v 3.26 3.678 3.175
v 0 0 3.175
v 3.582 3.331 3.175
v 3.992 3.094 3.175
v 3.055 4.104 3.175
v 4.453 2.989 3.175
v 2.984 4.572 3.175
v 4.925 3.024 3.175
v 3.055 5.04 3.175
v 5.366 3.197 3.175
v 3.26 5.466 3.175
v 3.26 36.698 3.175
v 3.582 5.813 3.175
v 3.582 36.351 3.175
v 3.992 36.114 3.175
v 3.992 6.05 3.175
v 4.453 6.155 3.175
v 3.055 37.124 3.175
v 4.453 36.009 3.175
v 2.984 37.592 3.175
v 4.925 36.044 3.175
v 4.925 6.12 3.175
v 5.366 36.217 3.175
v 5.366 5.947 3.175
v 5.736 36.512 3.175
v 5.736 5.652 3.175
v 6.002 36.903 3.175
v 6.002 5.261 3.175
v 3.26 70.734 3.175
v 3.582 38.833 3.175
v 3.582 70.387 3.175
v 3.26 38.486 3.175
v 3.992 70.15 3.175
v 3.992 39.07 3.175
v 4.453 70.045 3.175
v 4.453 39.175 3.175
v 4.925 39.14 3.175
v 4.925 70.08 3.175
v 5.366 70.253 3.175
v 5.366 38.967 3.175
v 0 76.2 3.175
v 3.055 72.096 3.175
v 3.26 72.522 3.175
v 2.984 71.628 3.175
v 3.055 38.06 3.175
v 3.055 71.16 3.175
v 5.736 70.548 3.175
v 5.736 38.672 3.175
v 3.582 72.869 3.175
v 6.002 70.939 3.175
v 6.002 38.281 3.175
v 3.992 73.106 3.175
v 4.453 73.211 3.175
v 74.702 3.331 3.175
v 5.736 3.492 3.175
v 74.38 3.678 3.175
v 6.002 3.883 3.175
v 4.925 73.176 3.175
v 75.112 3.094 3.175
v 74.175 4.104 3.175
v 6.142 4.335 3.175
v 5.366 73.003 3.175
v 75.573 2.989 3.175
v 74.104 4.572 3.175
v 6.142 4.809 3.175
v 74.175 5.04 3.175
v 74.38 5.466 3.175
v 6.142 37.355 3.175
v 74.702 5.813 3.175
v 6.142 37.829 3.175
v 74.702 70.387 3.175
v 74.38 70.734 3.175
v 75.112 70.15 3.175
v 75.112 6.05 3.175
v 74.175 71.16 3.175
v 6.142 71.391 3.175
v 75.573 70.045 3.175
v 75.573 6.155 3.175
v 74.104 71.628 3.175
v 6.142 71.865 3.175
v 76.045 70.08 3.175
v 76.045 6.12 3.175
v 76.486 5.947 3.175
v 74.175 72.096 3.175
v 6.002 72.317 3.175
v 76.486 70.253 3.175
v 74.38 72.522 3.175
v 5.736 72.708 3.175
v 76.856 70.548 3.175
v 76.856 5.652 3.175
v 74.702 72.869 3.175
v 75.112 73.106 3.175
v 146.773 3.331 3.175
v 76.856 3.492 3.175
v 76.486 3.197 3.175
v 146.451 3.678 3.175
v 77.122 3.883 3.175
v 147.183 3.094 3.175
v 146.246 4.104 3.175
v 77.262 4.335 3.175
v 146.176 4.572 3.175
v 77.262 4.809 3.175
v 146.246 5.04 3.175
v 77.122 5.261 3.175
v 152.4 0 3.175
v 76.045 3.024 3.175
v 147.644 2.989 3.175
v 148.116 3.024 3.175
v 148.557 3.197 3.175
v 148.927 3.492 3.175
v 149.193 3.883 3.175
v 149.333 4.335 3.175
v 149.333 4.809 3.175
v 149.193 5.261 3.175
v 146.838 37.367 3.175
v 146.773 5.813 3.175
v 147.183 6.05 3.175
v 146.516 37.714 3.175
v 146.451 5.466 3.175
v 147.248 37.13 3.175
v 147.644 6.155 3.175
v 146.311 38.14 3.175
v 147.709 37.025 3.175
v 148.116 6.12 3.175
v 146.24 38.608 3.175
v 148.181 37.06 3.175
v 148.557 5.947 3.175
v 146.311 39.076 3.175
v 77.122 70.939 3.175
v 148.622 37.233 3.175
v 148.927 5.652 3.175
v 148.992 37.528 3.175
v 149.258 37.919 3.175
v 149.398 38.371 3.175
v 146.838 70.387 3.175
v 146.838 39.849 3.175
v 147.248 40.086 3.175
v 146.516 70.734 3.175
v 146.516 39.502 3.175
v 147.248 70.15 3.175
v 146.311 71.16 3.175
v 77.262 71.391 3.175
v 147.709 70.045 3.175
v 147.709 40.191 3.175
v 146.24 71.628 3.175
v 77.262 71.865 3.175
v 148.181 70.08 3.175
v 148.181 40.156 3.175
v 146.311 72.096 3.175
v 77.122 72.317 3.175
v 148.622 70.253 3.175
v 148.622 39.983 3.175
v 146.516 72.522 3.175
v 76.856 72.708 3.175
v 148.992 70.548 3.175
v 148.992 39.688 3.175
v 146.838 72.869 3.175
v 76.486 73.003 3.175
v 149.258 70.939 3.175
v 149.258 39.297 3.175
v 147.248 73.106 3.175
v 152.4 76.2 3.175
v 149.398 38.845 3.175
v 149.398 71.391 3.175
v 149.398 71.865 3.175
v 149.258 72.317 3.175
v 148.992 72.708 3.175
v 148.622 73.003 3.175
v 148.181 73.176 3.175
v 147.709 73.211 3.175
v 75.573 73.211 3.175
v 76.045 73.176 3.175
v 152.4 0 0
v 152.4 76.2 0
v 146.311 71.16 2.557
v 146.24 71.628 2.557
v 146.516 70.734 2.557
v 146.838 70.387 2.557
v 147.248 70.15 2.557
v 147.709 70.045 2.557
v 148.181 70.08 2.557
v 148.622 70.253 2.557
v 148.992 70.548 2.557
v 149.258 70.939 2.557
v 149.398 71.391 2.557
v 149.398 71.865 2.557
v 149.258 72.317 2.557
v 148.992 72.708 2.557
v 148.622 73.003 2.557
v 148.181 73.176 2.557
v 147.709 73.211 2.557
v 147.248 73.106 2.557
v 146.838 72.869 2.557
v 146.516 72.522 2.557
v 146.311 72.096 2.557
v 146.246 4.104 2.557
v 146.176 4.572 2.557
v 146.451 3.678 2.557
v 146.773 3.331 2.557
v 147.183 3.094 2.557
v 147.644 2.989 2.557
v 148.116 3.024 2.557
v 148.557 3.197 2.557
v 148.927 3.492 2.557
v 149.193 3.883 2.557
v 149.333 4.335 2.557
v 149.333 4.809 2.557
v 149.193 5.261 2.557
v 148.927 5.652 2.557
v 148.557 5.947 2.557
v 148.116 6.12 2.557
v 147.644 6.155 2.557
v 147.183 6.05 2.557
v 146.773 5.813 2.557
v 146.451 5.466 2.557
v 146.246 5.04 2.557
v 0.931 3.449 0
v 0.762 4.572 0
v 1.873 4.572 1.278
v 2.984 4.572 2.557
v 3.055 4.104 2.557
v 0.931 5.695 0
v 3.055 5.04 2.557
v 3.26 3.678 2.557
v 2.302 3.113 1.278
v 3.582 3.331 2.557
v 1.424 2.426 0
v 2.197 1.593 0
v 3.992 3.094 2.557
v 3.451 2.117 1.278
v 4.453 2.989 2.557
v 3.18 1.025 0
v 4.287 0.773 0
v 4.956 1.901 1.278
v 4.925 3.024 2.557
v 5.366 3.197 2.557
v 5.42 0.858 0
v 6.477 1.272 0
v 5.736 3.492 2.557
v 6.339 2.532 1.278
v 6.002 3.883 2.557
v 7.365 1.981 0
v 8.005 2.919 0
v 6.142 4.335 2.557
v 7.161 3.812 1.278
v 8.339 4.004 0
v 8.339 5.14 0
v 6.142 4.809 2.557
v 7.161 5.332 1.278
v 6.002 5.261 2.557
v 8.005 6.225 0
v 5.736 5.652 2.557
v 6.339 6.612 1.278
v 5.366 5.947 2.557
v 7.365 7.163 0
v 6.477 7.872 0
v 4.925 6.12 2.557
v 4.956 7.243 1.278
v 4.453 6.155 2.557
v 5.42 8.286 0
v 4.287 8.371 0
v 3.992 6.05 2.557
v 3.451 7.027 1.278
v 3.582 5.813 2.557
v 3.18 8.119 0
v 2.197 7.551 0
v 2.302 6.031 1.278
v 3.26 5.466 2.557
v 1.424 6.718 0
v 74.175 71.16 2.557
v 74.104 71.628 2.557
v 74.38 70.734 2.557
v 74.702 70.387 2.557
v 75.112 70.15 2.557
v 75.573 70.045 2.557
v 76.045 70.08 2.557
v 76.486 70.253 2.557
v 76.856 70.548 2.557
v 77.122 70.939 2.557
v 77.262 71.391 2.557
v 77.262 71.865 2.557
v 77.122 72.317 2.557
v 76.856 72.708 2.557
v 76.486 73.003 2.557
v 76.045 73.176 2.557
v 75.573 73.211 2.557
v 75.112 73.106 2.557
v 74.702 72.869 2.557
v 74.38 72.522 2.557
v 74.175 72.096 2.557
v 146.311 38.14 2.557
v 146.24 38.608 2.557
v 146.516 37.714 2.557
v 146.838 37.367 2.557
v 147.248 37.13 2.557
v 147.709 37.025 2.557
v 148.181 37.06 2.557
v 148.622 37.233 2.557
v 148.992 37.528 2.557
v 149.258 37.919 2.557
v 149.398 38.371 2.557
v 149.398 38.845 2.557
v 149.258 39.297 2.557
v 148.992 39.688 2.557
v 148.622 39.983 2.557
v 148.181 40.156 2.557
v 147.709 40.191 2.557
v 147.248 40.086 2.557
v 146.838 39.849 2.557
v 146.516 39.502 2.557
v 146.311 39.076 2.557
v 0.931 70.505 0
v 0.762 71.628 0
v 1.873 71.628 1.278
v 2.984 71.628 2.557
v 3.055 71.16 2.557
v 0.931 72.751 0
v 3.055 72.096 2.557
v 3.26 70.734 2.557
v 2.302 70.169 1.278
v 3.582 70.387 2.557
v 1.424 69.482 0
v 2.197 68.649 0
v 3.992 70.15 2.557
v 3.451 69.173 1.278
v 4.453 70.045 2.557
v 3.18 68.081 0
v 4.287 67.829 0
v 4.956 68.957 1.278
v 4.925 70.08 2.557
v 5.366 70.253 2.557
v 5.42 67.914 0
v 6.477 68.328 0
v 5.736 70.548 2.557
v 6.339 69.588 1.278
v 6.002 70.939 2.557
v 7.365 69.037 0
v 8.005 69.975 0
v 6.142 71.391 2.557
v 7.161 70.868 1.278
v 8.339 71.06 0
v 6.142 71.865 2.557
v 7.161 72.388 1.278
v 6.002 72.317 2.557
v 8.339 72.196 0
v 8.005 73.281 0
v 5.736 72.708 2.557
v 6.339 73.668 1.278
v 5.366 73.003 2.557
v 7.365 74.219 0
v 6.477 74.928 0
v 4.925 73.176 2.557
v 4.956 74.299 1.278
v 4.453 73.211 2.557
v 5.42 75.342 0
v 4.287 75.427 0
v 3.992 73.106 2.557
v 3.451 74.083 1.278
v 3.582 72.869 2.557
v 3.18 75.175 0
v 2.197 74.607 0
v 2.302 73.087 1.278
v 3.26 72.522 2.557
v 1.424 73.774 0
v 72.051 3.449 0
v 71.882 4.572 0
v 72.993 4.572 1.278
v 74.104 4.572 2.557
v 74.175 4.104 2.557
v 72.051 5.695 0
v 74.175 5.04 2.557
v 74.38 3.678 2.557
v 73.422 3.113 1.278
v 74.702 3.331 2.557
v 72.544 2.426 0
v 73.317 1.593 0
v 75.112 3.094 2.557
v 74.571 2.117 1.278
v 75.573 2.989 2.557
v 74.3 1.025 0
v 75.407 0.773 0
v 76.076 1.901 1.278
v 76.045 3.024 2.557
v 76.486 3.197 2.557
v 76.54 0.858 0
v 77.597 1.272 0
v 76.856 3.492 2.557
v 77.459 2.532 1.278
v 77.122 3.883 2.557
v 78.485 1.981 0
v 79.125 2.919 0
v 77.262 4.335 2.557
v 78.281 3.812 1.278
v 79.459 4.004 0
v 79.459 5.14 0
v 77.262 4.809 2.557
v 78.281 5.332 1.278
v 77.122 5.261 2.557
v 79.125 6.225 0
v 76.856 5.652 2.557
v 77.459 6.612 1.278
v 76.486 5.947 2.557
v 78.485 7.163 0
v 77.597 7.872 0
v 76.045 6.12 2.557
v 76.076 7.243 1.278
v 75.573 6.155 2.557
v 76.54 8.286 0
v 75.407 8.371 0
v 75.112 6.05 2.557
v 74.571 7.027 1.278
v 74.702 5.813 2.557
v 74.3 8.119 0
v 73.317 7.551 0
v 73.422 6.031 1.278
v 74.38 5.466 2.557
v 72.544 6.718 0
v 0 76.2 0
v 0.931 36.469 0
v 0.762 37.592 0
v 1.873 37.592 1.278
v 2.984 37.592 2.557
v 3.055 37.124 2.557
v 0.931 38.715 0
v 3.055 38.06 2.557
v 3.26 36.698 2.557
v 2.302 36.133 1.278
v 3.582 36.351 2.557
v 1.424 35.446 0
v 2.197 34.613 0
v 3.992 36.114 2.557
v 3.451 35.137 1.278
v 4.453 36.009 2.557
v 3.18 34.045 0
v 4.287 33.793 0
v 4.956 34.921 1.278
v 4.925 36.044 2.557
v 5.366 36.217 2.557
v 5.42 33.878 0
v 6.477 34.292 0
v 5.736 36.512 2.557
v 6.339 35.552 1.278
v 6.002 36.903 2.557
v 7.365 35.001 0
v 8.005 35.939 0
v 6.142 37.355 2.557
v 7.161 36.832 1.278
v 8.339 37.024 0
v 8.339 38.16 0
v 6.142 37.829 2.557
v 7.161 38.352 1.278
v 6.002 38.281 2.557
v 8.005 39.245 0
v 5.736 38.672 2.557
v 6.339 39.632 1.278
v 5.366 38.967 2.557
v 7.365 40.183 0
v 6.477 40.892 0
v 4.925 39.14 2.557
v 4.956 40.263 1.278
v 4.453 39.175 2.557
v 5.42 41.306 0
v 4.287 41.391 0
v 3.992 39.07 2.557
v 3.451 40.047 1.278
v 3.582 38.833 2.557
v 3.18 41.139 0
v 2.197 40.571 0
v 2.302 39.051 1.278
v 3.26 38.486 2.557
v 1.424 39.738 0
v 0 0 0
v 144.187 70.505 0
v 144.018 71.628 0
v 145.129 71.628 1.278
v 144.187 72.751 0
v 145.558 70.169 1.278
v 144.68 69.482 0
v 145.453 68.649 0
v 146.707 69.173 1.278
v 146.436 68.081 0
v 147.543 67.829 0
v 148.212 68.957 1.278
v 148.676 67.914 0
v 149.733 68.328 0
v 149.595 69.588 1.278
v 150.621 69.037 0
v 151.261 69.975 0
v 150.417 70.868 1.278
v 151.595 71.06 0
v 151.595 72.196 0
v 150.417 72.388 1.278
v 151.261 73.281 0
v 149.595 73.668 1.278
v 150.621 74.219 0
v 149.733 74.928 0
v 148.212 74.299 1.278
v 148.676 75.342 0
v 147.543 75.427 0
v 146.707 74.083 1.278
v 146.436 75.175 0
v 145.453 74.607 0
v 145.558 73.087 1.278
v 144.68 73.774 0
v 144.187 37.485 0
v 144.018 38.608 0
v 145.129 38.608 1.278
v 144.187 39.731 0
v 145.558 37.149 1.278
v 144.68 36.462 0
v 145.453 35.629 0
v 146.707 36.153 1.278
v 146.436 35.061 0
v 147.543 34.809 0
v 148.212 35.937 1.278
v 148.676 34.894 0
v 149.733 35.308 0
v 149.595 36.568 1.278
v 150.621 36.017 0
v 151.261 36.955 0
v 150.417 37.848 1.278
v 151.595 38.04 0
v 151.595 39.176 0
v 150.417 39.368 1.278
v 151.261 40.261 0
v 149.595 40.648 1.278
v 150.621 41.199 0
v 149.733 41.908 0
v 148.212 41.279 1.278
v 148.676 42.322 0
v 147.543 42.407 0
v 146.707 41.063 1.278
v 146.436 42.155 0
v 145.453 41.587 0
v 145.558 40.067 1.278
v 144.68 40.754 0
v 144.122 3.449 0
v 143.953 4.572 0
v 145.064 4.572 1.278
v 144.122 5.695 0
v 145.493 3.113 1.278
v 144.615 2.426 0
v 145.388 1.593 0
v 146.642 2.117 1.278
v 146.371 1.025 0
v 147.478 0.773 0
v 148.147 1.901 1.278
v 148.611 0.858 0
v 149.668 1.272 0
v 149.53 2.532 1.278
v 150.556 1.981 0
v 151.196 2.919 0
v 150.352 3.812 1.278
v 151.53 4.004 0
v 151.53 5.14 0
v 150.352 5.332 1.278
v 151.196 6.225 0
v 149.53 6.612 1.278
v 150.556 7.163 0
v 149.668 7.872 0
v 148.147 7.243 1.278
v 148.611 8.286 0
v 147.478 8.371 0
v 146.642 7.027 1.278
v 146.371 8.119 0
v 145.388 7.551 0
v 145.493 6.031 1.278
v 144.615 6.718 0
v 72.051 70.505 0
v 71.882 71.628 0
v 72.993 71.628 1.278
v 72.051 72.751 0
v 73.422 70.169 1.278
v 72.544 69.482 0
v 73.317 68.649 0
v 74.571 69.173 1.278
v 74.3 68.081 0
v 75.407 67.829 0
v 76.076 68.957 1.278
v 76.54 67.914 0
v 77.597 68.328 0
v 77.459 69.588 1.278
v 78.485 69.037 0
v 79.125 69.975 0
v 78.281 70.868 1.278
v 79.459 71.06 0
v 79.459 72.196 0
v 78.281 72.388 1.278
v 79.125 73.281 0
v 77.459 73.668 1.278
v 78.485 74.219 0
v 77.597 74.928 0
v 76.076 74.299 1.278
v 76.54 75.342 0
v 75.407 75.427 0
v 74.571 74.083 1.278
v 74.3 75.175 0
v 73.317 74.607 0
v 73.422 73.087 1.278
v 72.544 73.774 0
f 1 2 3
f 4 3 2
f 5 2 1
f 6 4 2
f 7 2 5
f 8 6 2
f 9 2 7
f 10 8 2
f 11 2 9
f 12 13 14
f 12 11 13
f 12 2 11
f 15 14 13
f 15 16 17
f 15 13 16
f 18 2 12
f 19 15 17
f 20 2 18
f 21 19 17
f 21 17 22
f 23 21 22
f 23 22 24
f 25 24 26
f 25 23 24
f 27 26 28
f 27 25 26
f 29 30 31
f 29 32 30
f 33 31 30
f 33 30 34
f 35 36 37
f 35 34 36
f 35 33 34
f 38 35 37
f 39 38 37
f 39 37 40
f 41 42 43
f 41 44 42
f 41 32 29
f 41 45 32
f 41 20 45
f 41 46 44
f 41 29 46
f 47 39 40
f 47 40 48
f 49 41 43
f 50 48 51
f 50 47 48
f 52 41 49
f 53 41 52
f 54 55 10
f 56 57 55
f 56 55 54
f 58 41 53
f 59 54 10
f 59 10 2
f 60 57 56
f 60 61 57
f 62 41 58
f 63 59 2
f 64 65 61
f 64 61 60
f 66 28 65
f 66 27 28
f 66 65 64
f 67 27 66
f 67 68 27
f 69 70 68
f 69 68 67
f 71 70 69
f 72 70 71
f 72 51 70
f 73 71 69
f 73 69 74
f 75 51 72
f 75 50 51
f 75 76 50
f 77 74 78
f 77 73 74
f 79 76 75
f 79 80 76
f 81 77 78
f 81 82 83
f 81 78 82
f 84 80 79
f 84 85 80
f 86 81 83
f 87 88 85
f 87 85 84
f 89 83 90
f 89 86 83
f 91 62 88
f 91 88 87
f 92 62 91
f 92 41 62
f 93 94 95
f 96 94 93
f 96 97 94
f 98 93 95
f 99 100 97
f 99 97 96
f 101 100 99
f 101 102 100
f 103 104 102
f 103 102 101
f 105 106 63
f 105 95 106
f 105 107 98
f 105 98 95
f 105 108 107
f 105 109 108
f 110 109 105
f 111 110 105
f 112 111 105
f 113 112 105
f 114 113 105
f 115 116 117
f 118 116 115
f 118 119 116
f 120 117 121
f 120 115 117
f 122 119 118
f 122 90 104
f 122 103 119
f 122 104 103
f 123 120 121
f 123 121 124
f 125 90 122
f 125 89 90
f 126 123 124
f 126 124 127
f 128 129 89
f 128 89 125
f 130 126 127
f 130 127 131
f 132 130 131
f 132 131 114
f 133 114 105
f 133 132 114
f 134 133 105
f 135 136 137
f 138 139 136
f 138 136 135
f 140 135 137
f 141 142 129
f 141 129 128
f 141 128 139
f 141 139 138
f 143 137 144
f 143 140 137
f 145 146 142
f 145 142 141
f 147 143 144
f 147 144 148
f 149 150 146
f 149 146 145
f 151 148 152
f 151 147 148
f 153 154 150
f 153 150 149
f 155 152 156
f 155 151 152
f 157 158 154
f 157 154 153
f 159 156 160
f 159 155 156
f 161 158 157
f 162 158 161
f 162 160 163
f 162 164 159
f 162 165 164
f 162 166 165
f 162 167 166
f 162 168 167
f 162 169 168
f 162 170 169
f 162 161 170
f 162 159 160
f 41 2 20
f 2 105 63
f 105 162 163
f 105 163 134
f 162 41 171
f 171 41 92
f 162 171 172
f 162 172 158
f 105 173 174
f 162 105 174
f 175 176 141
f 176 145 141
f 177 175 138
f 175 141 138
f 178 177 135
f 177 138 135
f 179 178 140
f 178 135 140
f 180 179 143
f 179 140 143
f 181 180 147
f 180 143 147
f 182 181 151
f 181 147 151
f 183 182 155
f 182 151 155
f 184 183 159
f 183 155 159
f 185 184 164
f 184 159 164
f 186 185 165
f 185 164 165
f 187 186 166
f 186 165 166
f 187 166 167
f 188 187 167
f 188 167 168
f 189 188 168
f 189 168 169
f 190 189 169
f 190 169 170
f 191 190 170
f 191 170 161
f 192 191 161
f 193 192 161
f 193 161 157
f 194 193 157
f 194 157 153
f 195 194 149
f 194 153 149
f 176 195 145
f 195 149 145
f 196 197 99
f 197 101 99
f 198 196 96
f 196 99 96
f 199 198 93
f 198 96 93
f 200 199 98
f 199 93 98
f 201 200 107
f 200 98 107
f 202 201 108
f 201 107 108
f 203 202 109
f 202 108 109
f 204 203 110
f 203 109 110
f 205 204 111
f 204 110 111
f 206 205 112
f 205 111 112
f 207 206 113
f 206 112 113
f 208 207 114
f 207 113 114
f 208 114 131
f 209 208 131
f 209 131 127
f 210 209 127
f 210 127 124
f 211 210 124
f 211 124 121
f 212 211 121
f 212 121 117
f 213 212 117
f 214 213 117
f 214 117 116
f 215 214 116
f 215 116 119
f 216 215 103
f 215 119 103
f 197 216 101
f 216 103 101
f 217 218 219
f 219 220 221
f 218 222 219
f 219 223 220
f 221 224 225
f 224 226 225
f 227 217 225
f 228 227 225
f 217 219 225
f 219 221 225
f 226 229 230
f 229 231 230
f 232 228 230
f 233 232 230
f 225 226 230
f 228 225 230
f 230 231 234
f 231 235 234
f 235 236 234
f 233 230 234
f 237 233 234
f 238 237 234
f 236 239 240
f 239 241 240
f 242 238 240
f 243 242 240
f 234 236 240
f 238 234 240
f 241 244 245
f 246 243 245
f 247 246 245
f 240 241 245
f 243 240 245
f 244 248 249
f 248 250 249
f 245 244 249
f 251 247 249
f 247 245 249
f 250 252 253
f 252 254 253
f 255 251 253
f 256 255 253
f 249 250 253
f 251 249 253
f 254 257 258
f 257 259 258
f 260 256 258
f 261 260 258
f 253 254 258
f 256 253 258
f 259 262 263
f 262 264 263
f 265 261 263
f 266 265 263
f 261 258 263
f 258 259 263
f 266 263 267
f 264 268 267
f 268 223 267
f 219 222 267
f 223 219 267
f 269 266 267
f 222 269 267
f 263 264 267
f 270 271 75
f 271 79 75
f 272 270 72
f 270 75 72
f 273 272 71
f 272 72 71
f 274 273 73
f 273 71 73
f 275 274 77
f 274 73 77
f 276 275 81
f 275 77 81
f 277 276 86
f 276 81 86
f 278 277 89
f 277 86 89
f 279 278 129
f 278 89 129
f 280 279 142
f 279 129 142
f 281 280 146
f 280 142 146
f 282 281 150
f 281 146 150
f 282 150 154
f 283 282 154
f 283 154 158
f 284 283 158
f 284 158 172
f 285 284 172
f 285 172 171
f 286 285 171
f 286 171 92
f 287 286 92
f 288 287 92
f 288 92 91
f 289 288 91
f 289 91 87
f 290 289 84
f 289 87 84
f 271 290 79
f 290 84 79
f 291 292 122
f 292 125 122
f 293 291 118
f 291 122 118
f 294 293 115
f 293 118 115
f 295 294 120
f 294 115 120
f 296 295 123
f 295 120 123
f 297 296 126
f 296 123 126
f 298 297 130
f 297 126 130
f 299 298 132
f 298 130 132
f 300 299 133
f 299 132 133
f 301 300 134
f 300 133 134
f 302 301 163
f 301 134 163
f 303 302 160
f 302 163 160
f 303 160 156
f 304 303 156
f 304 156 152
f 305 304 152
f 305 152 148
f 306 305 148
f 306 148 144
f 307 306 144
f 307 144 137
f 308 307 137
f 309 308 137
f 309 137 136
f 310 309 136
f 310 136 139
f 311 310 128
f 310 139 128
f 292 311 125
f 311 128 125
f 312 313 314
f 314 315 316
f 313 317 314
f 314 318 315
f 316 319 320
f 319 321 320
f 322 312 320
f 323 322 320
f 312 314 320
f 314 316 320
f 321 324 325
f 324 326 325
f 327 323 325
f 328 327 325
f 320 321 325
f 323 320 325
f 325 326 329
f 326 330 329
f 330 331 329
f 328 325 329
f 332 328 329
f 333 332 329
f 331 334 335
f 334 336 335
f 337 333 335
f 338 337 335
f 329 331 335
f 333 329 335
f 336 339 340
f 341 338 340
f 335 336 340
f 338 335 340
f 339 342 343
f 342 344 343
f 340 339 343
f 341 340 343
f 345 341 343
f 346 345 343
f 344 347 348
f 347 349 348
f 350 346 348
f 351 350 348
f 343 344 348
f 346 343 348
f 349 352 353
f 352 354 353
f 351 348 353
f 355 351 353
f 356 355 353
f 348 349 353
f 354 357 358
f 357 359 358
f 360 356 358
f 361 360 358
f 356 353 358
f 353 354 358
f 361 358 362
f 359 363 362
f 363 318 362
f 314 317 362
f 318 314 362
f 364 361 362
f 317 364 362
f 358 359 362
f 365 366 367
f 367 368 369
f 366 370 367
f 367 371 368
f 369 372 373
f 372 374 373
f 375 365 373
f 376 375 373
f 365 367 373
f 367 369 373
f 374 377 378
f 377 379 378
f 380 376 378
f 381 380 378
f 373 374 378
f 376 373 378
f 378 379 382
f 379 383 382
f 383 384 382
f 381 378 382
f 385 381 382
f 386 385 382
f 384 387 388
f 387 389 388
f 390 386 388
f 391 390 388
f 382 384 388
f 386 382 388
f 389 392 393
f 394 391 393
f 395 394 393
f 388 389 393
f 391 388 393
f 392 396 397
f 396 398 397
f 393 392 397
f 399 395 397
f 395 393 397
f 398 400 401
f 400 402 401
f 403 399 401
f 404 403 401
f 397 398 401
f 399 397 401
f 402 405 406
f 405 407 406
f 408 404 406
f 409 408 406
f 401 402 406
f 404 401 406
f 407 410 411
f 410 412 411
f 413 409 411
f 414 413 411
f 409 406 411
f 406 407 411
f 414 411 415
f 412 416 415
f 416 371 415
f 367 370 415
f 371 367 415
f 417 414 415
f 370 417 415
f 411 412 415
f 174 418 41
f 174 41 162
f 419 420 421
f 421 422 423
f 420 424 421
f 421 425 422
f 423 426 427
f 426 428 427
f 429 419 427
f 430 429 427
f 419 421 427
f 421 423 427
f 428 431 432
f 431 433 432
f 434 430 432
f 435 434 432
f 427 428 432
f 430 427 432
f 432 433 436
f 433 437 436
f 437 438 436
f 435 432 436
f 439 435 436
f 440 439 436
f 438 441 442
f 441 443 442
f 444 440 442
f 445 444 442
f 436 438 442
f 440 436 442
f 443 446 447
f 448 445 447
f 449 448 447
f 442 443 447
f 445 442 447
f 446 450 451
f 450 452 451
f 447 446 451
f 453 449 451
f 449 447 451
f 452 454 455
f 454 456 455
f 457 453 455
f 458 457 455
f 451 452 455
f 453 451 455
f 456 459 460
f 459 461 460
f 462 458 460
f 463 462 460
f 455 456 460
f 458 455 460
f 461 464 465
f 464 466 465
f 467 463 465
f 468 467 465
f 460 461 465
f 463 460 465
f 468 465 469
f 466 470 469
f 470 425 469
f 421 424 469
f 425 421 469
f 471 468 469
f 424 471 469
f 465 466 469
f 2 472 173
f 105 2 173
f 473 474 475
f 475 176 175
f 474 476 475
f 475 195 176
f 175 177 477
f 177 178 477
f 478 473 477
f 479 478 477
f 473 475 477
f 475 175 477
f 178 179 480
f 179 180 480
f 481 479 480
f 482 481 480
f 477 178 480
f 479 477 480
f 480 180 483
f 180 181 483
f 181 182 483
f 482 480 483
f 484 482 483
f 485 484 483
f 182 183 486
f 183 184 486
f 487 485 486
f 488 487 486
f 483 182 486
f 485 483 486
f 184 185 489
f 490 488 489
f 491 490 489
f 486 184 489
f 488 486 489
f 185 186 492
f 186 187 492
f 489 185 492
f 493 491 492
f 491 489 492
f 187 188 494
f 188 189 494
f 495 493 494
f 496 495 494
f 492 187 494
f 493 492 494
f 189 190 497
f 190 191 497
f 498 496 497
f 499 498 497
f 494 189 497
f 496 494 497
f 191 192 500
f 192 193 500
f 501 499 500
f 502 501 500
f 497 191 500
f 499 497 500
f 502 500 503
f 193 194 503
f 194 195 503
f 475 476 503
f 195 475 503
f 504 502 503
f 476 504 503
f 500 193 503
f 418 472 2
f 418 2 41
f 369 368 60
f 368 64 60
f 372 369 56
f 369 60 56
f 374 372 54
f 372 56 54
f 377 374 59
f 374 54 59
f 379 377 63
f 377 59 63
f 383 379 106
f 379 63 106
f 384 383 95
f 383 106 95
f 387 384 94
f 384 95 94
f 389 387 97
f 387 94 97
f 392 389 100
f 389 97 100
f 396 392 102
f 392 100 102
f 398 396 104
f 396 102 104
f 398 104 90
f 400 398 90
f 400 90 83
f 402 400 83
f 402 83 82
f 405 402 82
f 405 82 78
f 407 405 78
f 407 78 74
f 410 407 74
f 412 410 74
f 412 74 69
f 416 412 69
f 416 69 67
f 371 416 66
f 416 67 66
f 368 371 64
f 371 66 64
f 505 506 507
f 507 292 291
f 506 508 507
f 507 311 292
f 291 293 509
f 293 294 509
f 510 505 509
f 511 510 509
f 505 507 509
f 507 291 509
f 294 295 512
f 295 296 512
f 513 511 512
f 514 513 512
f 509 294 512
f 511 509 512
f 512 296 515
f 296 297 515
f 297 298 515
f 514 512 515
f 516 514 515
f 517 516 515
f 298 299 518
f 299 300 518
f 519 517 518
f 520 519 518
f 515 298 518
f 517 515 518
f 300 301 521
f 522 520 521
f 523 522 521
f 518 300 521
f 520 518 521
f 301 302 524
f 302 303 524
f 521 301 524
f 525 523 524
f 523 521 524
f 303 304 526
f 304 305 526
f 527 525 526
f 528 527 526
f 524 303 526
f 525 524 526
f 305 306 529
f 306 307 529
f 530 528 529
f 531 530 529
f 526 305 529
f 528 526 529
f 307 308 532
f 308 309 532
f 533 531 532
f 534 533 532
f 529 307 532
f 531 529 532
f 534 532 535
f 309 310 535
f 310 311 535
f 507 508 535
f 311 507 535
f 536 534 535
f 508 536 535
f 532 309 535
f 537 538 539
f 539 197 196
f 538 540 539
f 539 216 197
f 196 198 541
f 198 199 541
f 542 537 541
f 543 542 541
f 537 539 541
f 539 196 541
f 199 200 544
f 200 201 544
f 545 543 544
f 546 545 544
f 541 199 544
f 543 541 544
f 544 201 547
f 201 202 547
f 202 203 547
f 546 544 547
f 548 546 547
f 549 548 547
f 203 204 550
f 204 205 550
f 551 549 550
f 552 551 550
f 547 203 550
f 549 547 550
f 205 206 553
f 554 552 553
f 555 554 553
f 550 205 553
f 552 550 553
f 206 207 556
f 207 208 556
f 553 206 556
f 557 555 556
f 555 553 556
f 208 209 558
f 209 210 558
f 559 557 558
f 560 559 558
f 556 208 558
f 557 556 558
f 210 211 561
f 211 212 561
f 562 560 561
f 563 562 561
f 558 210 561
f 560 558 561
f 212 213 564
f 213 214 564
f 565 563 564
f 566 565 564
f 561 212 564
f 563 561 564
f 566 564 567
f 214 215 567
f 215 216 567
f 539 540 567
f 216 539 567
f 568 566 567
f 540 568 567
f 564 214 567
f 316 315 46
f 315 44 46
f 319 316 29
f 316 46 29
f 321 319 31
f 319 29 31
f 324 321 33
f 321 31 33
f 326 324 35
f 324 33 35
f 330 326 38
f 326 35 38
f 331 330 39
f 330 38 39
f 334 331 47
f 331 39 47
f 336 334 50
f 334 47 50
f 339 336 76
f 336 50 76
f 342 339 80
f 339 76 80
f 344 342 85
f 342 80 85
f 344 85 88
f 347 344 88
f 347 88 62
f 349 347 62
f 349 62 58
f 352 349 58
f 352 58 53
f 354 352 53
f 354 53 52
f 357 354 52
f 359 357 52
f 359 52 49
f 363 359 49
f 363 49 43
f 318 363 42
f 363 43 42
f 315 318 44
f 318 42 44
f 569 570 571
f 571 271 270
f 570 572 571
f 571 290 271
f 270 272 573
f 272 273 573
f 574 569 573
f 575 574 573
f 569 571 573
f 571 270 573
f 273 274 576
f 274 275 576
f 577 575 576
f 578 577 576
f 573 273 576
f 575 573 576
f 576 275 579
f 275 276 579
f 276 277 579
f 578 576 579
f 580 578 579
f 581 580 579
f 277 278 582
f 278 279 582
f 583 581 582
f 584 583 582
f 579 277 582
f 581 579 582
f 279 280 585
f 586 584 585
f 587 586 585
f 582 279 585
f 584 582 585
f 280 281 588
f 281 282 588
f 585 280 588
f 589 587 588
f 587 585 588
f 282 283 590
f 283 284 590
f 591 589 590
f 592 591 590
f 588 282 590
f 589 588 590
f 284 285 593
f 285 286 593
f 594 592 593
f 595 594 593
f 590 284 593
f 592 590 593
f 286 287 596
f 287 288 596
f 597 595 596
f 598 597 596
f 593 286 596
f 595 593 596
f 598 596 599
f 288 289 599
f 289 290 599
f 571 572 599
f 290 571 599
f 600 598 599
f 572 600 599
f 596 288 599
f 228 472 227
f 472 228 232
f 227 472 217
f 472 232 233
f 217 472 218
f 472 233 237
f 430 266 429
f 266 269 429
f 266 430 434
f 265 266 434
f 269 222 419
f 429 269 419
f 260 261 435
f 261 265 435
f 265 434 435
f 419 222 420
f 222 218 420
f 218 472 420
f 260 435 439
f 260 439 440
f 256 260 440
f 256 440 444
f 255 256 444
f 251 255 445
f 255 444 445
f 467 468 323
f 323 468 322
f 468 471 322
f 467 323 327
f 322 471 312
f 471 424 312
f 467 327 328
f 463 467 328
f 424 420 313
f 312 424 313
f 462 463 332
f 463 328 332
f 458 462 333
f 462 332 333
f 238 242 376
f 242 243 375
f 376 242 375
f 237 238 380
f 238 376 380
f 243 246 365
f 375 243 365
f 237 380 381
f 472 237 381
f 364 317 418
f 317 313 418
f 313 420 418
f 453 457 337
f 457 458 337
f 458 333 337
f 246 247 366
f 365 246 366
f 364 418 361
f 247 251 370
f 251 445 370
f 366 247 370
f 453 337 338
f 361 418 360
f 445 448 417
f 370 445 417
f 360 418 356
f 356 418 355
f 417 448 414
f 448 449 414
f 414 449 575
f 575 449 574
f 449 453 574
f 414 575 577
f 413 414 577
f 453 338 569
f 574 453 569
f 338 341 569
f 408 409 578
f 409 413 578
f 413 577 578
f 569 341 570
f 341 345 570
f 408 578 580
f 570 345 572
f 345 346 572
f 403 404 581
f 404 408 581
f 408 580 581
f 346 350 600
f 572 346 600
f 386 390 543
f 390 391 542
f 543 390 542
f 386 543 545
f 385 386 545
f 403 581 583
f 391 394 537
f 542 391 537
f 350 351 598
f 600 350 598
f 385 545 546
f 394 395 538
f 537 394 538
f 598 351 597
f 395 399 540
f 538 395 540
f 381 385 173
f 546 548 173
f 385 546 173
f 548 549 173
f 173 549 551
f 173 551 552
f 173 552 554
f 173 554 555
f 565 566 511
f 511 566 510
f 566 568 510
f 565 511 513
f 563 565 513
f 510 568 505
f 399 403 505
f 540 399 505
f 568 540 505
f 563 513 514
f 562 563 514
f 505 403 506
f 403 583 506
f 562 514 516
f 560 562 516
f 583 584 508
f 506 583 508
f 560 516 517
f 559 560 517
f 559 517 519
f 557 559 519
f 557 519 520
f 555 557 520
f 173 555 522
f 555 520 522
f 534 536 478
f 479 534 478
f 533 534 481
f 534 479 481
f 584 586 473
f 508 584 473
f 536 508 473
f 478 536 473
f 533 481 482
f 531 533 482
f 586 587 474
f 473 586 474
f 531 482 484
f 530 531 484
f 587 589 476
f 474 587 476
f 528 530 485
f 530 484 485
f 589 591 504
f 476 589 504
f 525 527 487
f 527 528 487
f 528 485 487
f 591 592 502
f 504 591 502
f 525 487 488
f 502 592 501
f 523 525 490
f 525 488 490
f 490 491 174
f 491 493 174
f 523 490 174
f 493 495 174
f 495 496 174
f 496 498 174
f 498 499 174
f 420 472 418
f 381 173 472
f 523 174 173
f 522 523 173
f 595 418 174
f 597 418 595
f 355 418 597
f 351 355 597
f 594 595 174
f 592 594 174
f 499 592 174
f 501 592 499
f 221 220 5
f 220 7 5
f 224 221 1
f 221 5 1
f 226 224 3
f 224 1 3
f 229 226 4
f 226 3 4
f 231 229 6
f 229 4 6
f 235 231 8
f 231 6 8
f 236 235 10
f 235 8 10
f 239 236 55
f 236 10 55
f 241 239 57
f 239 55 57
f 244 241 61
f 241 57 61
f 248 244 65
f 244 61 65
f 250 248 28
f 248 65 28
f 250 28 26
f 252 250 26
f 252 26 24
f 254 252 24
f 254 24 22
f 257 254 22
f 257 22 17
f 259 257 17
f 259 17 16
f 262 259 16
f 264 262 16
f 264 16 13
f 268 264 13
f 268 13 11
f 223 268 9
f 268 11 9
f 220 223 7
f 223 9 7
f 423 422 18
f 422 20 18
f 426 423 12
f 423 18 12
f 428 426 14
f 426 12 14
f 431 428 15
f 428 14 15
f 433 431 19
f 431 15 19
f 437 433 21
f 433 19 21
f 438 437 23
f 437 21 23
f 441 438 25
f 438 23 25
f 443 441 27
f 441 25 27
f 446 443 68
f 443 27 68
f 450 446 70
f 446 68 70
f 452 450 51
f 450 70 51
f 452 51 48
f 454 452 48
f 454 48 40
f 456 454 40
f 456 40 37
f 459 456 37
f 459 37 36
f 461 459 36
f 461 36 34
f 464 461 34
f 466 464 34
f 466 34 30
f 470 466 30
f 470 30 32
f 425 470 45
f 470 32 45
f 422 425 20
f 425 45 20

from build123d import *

# Parameters (mm, degrees)
F0_W           = 152.4
F0_H           = 76.2
F1_DEPTH       = 3.175
F3_D           = 3.175
F3_CSINK_D     = 7.62
F3_CSINK_ANGLE = 82


with BuildPart() as f1:
    # F0 (on Top) → F1 (new body)
    with BuildSketch(Plane.XY):
        with Locations((76.2, 38.1)):
            Rectangle(F0_W, F0_H)
    extrude(amount=F1_DEPTH)

    # F3 (through all)
    with Locations(Plane(origin=(0, 0, 0), x_dir=(1, 0, 0), z_dir=(0, 0, -1))):
        with Locations((4.572, -4.572), (4.572, -37.592), (4.572, -71.628), (75.692, -71.628), (147.828, -71.628), (147.828, -38.608), (147.828, -457.2), (75.692, -4.572), (147.763029, -4.572)):
            CounterSinkHole(F3_D / 2, F3_CSINK_D / 2, counter_sink_angle=F3_CSINK_ANGLE)


solid = f1.part
